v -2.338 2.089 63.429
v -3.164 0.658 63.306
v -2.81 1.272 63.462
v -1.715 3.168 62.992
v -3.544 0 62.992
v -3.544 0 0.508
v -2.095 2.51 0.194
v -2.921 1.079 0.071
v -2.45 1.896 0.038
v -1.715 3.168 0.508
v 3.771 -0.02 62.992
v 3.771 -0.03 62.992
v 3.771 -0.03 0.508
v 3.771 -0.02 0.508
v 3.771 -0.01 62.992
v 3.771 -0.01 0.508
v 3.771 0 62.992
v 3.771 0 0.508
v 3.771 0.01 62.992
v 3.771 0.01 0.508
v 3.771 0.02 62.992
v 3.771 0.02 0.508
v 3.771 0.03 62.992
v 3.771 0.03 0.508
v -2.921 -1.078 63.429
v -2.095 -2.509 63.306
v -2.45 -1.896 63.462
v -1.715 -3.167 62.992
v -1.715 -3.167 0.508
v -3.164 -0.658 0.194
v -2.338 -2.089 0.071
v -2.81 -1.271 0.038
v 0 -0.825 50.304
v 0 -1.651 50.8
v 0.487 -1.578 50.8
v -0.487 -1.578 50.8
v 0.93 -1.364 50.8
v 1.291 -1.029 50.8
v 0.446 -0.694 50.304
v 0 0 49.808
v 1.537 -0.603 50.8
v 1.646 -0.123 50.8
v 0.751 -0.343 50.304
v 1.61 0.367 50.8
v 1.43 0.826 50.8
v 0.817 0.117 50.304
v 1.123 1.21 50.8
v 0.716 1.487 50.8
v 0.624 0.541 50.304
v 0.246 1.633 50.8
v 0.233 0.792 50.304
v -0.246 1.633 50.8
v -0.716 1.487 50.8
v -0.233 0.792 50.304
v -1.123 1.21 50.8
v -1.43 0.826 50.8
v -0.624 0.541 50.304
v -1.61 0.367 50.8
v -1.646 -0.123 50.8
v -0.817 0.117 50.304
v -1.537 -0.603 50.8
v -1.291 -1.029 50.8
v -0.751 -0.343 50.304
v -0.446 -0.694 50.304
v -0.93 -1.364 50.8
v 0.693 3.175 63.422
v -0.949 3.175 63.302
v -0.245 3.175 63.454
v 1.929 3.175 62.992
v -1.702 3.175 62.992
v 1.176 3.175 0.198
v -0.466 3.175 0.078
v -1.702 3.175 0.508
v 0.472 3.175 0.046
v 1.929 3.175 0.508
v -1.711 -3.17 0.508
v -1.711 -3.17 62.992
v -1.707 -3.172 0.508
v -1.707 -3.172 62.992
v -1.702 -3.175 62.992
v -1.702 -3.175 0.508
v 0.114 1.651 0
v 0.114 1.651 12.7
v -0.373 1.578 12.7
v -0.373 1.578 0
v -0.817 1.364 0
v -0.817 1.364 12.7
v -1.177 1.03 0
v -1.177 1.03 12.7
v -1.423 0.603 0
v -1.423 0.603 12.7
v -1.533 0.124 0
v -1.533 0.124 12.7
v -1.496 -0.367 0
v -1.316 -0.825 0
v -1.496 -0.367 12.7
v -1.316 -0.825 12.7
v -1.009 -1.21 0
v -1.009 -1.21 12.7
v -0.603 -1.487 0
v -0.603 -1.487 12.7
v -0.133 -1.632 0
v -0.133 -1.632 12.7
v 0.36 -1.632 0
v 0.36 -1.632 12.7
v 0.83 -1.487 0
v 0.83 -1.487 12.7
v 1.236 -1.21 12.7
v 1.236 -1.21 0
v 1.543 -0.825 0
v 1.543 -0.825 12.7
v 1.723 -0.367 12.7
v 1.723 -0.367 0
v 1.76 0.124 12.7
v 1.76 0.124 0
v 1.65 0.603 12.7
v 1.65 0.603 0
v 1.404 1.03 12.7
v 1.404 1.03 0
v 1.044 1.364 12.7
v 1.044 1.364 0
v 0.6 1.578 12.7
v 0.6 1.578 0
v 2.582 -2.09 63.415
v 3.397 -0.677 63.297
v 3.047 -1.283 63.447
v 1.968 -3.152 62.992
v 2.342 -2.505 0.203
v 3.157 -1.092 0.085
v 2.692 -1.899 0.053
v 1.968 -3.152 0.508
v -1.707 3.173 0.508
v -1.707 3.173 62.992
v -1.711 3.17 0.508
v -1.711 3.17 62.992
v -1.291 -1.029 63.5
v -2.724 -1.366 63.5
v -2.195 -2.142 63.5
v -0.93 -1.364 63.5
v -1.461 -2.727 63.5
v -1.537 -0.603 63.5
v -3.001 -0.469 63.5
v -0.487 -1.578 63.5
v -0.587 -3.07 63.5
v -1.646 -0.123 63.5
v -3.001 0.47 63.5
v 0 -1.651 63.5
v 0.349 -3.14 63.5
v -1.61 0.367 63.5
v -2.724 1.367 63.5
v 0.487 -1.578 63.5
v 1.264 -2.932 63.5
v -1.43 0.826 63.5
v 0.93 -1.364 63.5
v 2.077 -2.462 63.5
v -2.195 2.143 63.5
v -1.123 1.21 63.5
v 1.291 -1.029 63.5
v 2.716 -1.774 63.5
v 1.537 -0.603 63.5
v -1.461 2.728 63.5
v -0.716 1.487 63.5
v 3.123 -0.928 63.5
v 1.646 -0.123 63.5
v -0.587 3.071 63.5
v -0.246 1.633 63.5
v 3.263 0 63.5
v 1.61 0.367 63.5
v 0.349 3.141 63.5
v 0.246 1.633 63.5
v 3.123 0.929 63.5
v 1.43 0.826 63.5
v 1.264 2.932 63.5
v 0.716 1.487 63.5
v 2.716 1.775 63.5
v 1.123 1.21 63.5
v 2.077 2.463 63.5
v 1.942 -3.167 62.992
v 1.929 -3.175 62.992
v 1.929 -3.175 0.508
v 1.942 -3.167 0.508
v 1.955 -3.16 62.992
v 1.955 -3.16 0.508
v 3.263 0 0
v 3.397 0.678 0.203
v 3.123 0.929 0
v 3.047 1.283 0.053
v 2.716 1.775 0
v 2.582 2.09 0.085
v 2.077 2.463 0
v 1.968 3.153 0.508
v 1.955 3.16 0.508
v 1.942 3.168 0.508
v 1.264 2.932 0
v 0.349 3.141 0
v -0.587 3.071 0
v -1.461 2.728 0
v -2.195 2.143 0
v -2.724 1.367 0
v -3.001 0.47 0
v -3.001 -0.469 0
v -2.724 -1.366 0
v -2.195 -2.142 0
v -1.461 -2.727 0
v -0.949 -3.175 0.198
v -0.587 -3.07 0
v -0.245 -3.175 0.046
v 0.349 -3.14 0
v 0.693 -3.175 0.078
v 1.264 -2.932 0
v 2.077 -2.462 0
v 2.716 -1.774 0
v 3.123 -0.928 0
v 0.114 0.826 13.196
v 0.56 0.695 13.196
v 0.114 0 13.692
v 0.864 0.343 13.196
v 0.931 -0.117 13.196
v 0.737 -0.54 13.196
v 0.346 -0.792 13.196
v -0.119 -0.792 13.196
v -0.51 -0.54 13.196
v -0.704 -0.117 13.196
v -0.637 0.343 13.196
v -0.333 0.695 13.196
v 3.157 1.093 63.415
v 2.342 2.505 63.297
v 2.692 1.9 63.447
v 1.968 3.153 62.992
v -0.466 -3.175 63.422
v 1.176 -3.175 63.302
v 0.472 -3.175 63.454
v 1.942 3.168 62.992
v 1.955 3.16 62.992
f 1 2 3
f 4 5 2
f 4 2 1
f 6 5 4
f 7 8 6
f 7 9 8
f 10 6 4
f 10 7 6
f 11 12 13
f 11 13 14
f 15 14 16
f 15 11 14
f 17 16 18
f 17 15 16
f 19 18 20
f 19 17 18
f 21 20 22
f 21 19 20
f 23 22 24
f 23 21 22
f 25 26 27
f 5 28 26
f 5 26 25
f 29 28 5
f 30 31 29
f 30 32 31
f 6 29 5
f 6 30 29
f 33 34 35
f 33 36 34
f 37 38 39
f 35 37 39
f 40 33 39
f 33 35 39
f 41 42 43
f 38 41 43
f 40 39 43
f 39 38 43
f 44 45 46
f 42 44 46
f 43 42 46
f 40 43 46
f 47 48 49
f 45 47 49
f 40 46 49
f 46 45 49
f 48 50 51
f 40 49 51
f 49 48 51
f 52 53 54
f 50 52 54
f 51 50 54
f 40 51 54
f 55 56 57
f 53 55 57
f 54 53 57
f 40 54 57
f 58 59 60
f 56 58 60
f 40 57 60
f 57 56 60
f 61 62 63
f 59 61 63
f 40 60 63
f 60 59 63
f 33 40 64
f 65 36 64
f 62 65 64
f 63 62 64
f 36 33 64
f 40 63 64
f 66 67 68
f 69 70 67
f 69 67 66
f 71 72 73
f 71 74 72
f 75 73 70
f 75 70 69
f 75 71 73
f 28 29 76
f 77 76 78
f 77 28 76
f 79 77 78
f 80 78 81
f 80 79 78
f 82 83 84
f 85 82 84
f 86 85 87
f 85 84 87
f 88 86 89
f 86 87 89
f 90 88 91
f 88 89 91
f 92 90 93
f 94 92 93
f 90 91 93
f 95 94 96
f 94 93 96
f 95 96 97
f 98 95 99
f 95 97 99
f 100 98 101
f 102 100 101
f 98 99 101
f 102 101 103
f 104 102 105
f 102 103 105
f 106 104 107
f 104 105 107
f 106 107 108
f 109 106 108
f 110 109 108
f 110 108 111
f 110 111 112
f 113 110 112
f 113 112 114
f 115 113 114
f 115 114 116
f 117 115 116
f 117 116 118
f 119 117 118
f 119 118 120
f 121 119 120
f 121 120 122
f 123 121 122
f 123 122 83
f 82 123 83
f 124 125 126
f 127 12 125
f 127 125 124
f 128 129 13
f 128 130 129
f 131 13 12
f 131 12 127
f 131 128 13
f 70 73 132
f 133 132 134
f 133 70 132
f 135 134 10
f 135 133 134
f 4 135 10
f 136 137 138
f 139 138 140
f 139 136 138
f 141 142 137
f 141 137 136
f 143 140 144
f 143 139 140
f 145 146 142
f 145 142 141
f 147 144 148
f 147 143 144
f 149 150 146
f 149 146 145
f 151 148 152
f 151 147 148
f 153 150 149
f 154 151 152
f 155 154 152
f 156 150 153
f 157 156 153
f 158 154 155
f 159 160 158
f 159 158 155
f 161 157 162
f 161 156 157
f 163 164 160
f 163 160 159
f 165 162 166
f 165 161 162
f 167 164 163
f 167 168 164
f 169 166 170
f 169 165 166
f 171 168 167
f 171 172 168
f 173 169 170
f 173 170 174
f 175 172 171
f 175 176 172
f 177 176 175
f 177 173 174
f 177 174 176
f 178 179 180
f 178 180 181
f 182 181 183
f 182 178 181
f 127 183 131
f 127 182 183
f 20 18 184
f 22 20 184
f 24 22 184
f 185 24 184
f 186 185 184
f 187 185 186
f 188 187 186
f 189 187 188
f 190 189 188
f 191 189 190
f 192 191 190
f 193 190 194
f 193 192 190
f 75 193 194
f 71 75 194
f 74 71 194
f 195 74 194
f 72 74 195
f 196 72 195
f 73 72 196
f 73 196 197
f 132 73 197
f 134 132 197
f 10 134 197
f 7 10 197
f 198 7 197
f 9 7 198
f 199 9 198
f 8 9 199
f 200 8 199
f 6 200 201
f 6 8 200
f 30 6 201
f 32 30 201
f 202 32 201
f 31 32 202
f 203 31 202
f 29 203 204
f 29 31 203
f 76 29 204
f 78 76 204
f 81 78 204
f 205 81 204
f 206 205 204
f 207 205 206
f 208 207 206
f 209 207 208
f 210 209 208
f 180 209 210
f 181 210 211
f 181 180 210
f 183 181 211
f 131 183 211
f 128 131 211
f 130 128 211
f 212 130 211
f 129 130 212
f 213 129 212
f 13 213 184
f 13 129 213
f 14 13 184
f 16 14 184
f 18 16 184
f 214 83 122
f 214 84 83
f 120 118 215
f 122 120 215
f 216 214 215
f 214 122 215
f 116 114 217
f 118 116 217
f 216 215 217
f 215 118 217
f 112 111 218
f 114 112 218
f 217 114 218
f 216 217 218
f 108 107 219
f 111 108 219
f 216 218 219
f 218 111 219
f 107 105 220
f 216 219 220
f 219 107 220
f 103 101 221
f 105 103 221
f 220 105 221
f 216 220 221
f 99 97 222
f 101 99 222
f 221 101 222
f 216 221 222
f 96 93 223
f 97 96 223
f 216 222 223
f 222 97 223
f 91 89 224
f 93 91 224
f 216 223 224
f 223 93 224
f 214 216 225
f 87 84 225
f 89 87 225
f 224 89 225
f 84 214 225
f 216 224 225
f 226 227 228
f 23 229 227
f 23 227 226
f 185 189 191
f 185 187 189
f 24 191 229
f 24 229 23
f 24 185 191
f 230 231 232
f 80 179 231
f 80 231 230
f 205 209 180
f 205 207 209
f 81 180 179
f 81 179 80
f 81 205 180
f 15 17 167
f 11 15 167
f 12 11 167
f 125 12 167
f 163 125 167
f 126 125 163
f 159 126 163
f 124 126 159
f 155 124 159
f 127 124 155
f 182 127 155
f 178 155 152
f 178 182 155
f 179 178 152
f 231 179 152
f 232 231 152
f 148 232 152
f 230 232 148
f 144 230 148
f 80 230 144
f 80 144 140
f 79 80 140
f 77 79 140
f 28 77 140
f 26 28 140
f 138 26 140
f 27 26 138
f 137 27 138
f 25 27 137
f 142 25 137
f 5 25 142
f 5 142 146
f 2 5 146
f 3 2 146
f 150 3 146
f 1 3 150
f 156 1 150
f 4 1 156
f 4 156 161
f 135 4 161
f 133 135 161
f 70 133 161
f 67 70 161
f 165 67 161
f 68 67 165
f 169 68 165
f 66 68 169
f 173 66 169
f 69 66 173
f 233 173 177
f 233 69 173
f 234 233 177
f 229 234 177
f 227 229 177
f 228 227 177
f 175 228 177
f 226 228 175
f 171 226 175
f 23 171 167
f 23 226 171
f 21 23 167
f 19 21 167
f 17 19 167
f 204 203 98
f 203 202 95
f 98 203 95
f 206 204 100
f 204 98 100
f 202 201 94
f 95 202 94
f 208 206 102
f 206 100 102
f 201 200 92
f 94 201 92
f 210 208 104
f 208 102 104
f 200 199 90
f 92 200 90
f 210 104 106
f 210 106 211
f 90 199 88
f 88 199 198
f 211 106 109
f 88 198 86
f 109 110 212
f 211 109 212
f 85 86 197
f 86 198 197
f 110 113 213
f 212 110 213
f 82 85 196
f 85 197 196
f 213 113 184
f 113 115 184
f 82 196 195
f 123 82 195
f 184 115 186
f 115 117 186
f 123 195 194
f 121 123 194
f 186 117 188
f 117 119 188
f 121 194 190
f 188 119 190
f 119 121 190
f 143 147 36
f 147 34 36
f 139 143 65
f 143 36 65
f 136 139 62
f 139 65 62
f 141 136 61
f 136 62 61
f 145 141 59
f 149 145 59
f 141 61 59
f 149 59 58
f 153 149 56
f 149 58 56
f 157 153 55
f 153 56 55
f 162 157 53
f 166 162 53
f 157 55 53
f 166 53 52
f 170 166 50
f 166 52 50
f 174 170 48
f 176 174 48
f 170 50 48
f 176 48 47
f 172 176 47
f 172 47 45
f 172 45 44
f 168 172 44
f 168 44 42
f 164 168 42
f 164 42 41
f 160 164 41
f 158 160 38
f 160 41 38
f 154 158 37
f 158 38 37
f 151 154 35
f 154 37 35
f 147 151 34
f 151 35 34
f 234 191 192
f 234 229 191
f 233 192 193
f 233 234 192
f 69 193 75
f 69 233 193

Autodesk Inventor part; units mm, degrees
ref_plane "YZ Plane" through (0, 0, 0) normal (1, 0, 0) x (0, 1, 0)
sketch "Sketch1" plane through (0, 0, 0) normal (0, 0, 1) x (1, 0, 0)
  line L0 (1.9552, -3.1747) -> (-1.711, -3.1747)
  line L1 (-1.711, -3.1747) -> (-3.5441, 0.0003)
  line L2 (-3.5441, 0.0003) -> (-1.711, 3.1753)
  line L3 (-1.711, 3.1753) -> (1.9552, 3.1753)
  line L4 (1.9552, 3.1753) -> (3.7883, 0.0003)
  line L5 (3.7883, 0.0003) -> (1.9552, -3.1747)
  point P0 (0.1221, 0.0003)
  dimension "d0" = 6.35
extrude "Extrusion1" add sketch "Sketch1" along normal blind 63.5
ref_plane "Work Plane1" through (-1.711, 0.0003, 0) normal (0, 1, 0) x (1, 0, 0)
sketch "Sketch3" plane through (-1.711, 0.0003, 0) normal (0, 1, 0) x (1, 0, 0)
  line L0 (-1.3251, 0) -> (4.9741, 0)
  line L1 (5.4821, -0.508) -> (5.4821, -62.992)
  line L2 (-1.8331, -62.992) -> (-1.8331, -0.508)
  line L3 (-1.8331, -0.508) -> (-1.3251, 0)
  line L4 (4.9741, 0) -> (5.4821, -0.508)
  line L5 (-1.8331, 0) -> (-1.8331, -63.5) projected
  line L6 (3.6662, 0) -> (5.4993, 0) projected
  line L7 (1.8245, 0) -> (1.8245, -63.5)
  line L8 (0, -63.5) -> (-1.8331, -63.5) projected
  line L9 (5.4993, -63.5) -> (3.6662, -63.5) projected
  line L10 (3.6662, -63.5) -> (0, -63.5) projected
  line L11 (-1.3251, -63.5) -> (-1.8331, -62.992)
  line L12 (4.9741, -63.5) -> (5.4821, -62.992)
  point P0 (-1.8331, 0)
  point P1 (5.4821, 0)
  point P2 (5.4821, -63.5)
  dimension "d5" = 0.508
  dimension "d6" = 0.508
  dimension "d7" = 0.508
  dimension "d8" = 0.508
  dimension "d16" = 0
  dimension "d46" = 0.508
  dimension "d47" = 0.508
  dimension "d48" = 0.508
  dimension "d49" = 0.508
revolve "Revolution1" cut sketch "Sketch3" angle 360 about axis through (0.1135, 0.0003, 0) along (0, 0, 1) keep common part contours L0 L4 L1 L12 L9 L10 L7
sketch "Sketch6" plane through (0.1135, 0.0003, 0) normal (0, 0, -1) x (-1, 0, 0)
  circle A0 centre (0, 0) radius 3.1496 projected
hole "Hole3" at (0.1135, 0.0003, 0) direction (0, 0, 1) diameter 3.302 depth 12.7 tip angle 118 thread size "8-32 UNC" class "2B" standard "ANSI Unified Screw Threads"
sketch "Sketch7" plane through (0, 0, 63.5) normal (0, 0, 1) x (1, 0, 0)
  point P0 (0, 0)
hole "Hole4" at (0, 0, 63.5) direction (0, 0, -1) diameter 3.302 depth 12.7 tip angle 118 thread size "8-32 UNC" class "2B" standard "ANSI Unified Screw Threads"
ref_plane "Work Plane2" through (0.1135, 0.0003, 31.75) normal (0, 0, -1) x (-1, 0, 0)
equation "\"d6\" = d5"
equation "\"d7\" = d5"
equation "\"d8\" = d7"
properties part number "2.5 inch Standoff" material "Steel"
